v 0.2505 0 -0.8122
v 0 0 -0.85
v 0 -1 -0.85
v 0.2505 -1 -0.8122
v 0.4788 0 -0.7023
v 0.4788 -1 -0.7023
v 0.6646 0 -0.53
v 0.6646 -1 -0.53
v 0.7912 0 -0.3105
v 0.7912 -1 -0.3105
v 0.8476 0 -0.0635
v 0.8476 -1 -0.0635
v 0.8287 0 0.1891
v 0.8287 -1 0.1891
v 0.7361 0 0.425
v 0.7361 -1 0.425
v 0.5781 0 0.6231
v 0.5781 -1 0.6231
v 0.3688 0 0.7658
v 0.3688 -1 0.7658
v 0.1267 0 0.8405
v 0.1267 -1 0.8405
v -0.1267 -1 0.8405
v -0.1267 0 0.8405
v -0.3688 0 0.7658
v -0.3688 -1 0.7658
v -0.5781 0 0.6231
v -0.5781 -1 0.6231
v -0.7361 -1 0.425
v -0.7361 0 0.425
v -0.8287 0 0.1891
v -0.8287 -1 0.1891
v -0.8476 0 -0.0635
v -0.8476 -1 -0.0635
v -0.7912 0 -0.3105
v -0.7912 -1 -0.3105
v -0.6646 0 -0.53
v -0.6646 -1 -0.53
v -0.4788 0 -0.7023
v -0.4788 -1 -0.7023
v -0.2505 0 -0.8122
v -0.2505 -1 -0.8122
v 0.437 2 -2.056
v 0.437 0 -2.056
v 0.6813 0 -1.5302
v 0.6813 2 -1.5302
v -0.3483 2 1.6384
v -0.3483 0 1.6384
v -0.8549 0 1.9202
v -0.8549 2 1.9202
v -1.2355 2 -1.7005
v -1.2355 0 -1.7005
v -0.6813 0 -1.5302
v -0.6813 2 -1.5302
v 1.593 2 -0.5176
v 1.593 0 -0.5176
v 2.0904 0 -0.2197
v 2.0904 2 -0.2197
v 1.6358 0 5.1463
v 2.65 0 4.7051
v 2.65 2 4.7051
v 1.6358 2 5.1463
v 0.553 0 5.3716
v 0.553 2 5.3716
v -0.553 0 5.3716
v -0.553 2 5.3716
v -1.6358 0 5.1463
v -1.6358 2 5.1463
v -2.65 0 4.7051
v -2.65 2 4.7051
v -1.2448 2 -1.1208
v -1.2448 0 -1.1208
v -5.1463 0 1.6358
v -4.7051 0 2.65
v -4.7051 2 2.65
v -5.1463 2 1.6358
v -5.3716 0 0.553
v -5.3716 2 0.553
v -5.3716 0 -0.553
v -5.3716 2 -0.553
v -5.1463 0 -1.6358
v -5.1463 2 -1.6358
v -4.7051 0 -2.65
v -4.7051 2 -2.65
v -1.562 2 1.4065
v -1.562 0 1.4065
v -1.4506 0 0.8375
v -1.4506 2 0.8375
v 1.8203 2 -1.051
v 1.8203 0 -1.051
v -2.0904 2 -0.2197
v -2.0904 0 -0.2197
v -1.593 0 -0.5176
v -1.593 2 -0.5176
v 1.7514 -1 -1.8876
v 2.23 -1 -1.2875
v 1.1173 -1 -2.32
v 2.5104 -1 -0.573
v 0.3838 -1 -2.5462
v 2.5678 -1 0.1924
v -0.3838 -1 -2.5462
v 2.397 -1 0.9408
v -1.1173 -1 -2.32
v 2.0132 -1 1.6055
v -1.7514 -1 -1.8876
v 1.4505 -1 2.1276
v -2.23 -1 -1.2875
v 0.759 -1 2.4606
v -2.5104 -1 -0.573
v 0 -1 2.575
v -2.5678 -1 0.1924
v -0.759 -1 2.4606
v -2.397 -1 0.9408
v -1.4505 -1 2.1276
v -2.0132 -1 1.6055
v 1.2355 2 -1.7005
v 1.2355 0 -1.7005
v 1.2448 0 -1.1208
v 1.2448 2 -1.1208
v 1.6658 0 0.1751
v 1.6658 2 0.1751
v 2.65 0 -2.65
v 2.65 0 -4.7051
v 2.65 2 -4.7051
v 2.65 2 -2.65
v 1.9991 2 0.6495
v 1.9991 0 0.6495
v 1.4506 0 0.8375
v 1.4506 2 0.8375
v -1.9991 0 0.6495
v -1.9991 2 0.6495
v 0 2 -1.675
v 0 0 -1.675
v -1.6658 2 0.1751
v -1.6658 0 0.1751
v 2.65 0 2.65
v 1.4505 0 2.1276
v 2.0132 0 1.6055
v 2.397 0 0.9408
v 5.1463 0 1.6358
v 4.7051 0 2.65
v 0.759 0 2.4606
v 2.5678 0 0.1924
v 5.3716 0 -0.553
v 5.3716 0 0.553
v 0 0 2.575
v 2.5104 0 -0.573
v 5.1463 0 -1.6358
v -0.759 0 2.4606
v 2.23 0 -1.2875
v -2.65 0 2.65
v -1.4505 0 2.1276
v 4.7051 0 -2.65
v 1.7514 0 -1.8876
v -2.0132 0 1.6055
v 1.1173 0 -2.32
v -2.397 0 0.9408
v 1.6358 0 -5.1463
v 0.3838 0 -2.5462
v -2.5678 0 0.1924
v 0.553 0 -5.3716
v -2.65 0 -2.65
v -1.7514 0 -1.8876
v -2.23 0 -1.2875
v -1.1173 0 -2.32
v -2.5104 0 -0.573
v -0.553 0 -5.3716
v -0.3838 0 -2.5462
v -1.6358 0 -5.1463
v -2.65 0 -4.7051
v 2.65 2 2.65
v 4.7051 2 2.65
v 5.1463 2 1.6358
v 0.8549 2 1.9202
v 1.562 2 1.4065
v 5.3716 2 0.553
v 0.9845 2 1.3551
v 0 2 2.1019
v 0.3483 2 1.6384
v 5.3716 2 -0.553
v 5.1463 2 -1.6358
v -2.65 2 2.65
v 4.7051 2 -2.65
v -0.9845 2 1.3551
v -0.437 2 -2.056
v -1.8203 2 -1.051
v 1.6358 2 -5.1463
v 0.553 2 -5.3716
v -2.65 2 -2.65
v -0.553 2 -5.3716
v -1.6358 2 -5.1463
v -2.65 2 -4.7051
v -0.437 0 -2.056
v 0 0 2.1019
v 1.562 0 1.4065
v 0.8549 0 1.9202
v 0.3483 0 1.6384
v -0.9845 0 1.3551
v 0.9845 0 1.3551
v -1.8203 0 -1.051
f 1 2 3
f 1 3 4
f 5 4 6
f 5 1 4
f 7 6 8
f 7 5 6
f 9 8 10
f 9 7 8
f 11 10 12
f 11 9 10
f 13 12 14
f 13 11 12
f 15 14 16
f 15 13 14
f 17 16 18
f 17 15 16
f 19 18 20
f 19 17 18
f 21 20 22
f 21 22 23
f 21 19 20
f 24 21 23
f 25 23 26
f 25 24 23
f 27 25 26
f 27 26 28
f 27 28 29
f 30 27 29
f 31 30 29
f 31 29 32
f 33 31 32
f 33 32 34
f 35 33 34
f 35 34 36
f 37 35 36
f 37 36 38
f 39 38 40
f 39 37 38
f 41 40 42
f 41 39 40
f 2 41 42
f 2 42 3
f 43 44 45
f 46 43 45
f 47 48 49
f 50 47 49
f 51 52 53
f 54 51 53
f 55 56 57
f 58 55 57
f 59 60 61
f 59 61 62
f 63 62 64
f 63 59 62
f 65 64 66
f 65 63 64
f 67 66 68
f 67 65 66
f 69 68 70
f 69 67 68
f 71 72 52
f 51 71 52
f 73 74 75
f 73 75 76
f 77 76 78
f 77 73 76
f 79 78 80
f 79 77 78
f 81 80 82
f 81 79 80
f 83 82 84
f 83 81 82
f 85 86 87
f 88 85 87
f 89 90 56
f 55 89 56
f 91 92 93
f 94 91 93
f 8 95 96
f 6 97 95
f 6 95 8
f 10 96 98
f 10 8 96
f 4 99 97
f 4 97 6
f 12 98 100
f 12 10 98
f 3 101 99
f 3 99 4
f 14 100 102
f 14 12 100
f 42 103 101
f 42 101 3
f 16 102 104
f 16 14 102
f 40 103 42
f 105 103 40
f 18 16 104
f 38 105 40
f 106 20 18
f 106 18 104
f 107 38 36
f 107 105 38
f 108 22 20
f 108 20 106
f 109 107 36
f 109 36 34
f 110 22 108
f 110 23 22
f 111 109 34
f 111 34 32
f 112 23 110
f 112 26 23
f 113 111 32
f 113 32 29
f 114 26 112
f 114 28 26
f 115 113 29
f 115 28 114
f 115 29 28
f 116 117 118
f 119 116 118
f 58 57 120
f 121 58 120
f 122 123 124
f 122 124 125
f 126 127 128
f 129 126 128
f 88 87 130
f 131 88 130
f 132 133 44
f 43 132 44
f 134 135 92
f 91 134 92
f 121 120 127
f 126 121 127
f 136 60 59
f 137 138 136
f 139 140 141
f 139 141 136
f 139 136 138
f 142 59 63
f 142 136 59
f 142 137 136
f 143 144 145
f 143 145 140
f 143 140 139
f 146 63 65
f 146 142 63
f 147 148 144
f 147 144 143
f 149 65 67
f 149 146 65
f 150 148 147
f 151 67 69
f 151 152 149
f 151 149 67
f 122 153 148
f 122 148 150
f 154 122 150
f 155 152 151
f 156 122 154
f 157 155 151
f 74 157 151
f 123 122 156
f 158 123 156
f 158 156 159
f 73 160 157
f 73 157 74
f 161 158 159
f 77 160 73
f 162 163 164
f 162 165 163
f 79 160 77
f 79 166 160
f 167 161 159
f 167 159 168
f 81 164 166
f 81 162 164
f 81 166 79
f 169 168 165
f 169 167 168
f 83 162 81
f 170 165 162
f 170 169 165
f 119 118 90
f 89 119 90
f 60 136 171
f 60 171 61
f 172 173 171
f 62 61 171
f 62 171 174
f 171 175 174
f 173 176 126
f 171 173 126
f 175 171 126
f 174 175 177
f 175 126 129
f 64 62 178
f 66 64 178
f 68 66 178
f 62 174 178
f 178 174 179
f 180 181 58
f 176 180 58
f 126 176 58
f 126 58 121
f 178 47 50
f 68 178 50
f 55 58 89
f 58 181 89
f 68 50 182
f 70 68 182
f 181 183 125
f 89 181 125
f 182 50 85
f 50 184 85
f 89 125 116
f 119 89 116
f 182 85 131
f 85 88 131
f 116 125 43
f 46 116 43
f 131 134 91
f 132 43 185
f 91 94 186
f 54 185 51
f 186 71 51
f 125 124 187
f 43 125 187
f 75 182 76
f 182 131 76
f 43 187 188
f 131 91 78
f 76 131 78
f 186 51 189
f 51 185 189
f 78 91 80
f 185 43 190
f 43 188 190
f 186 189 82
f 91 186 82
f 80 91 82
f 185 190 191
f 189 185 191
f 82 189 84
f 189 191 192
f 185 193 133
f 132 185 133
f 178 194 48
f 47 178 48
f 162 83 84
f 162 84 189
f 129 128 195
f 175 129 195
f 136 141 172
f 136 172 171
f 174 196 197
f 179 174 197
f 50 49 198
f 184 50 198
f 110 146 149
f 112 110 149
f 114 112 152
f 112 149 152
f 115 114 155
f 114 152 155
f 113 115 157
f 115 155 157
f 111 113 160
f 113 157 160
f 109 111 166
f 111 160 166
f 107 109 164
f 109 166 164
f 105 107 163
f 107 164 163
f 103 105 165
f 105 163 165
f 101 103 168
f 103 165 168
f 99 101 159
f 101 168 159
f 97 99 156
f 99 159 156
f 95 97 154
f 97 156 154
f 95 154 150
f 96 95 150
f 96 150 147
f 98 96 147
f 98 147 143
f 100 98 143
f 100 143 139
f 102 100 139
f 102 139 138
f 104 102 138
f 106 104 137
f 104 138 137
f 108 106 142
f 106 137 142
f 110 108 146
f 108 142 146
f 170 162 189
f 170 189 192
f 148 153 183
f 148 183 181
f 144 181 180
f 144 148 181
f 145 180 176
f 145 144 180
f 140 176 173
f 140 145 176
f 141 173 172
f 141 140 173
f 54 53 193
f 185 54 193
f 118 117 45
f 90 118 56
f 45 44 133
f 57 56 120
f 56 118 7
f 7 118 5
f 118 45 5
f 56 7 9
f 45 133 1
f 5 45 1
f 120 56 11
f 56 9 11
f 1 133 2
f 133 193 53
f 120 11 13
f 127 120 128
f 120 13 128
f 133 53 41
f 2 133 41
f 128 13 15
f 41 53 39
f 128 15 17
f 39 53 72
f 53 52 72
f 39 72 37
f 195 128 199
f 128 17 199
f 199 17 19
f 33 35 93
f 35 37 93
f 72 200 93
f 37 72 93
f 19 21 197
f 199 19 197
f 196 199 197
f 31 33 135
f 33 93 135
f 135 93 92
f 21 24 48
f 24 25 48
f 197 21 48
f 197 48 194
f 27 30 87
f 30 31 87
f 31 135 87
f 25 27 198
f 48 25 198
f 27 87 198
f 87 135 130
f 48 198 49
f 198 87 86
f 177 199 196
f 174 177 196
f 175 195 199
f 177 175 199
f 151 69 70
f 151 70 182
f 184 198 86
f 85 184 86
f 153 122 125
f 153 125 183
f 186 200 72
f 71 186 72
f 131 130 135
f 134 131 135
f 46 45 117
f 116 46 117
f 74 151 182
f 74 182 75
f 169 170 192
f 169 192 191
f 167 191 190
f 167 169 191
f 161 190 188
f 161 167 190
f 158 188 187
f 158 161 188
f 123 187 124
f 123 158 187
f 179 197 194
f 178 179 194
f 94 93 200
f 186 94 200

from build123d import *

# Parameters (mm, degrees)
EXTRUDE_1_DEPTH = 2
SKETCH_2_R      = 2.575
SKETCH_2_R_2    = 0.85
EXTRUDE_2_DEPTH = 1


with BuildPart() as part:
    # ｽｹｯﾁ1 → ﾎﾞｽ - 押し出し1 (new body)
    with BuildSketch(Plane(origin=(0, 0, 0), x_dir=(1, 0, 0), z_dir=(0, 1, 0))):
        with BuildLine():
            Line((2.65, 4.705050478), (2.65, 2.65))
            Line((2.65, 2.65), (4.705050478, 2.65))
            ThreePointArc((4.705050478, 2.65), (5.4, 0), (4.705050478, -2.65))
            Line((4.705050478, -2.65), (2.65, -2.65))
            Line((2.65, -2.65), (2.65, -4.705050478))
            ThreePointArc((2.65, -4.705050478), (0, -5.4), (-2.65, -4.705050478))
            Line((-2.65, -4.705050478), (-2.65, -2.65))
            Line((-2.65, -2.65), (-4.705050478, -2.65))
            ThreePointArc((-4.705050478, -2.65), (-5.4, 0), (-4.705050478, 2.65))
            Line((-4.705050478, 2.65), (-2.65, 2.65))
            Line((-2.65, 2.65), (-2.65, 4.705050478))
            ThreePointArc((-2.65, 4.705050478), (0, 5.4), (2.65, 4.705050478))
        make_face()
        Polygon((0, 1.675), (0.437016815, 2.056002469), (0.681283877, 1.530188642), (1.235486269, 1.700500964), (1.244767583, 1.120793766), (1.820328922, 1.050967393), (1.593019665, 0.517603466), (2.090420168, 0.219712013), (1.665824175, -0.175085176), (1.999058776, -0.64953357), (1.450592551, -0.8375), (1.56204196, -1.406468898), (0.984540298, -1.355103466), (0.854933899, -1.920212977), (0.348252082, -1.638397231), (0, -2.101934787), (-0.348252082, -1.638397231), (-0.854933899, -1.920212977), (-0.984540298, -1.355103466), (-1.56204196, -1.406468898), (-1.450592551, -0.8375), (-1.999058776, -0.64953357), (-1.665824175, -0.175085176), (-2.090420168, 0.219712013), (-1.593019665, 0.517603466), (-1.820328922, 1.050967393), (-1.244767583, 1.120793766), (-1.235486269, 1.700500964), (-0.681283877, 1.530188642), (-0.437016815, 2.056002469), align=None, mode=Mode.SUBTRACT)
    extrude(amount=EXTRUDE_1_DEPTH)

    # ｽｹｯﾁ2 → ﾎﾞｽ - 押し出し2 (add)
    with BuildSketch(Plane.XZ):
        with Locations(Location((0, 0, 0), (0, 0, 90))):
            Circle(SKETCH_2_R)
        with Locations(Location((0, 0, 0), (0, 0, 270))):
            Circle(SKETCH_2_R_2, mode=Mode.SUBTRACT)
    extrude(amount=EXTRUDE_2_DEPTH)


solid = part.part
